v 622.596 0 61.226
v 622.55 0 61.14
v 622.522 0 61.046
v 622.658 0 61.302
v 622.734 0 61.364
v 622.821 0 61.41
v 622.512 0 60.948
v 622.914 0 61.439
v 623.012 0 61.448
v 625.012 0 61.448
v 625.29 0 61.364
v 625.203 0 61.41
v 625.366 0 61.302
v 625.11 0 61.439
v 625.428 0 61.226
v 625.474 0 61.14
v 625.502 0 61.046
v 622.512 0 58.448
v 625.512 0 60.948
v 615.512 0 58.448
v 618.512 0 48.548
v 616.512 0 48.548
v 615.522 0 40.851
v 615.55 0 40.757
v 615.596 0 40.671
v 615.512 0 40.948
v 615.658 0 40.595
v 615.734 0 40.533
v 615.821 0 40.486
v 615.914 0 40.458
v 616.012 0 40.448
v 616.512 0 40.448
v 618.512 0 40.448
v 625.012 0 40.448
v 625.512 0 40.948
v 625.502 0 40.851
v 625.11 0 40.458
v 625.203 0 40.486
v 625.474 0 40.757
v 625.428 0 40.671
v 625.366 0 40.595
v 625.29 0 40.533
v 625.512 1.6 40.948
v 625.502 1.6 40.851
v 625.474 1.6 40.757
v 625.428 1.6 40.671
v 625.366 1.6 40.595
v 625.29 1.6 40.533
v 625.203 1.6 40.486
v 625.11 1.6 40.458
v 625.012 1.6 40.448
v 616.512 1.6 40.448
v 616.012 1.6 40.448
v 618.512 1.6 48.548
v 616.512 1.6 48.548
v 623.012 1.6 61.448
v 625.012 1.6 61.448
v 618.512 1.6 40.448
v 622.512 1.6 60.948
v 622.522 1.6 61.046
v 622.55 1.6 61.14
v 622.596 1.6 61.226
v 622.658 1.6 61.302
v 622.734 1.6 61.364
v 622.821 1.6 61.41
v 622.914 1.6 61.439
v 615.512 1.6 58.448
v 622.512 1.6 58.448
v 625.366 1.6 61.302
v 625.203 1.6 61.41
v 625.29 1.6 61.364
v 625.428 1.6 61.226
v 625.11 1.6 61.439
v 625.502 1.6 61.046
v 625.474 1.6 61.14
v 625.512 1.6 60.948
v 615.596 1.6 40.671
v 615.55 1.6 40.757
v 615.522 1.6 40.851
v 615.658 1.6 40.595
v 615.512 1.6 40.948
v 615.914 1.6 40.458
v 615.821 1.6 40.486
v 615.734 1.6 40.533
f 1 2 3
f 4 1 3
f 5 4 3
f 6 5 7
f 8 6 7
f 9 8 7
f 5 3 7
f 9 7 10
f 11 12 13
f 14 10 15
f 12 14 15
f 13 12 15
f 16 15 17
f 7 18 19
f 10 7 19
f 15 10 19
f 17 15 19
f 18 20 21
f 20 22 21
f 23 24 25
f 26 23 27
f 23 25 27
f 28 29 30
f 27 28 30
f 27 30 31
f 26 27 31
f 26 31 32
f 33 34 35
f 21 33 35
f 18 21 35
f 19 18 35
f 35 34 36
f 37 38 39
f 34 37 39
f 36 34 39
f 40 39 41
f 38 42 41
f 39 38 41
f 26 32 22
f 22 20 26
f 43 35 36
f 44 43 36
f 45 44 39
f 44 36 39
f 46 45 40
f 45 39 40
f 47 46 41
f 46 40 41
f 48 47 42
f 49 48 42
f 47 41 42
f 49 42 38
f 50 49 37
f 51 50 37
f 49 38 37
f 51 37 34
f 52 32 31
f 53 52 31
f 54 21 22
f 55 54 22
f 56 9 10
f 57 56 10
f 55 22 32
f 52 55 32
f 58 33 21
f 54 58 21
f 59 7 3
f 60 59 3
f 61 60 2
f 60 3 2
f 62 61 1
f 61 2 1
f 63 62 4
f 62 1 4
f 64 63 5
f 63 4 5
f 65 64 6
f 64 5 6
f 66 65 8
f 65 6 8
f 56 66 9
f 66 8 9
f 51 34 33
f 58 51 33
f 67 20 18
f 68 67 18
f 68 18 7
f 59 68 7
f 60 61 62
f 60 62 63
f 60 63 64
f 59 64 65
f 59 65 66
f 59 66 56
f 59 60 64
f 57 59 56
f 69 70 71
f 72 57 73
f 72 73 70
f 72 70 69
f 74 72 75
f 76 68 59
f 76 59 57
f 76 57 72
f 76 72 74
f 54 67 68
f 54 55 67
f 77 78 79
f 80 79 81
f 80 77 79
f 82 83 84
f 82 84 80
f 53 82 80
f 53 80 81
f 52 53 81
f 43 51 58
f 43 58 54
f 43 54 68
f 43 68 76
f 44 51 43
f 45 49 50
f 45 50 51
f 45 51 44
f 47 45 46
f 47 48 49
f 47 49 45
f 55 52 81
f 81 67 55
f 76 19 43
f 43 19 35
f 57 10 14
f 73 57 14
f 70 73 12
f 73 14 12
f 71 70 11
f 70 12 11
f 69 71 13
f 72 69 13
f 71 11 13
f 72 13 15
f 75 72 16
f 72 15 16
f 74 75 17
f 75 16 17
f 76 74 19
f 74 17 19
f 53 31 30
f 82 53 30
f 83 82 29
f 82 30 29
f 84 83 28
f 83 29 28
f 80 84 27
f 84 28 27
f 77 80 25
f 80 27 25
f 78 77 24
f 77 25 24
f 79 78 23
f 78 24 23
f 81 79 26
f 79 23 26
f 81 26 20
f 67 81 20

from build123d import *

# Parameters (mm, degrees)
BOSS_EXTRUDE1_DEPTH = 1.6


with BuildPart() as part:
    # Sketch1 → Boss-Extrude1 (new body)
    with BuildSketch(Plane(origin=(0, 0, 0), x_dir=(1, 0, 0), z_dir=(0, 1, 0))):
        with BuildLine():
            Line((623.01202177, -61.448413556), (625.01202177, -61.448413556))
            ThreePointArc((625.01202177, -61.448413556), (625.36557516, -61.301966947), (625.51202177, -60.948413556))
            Line((625.51202177, -60.948413556), (625.51202177, -40.948413556))
            ThreePointArc((625.51202177, -40.948413556), (625.36557516, -40.594860166), (625.01202177, -40.448413556))
            Line((625.01202177, -40.448413556), (618.76202177, -40.448413556))
            Line((618.76202177, -40.448413556), (618.51202177, -40.448413556))
            Line((618.51202177, -40.448413556), (618.51202177, -48.548413556))
            Line((618.51202177, -48.548413556), (616.51202177, -48.548413556))
            Line((616.51202177, -48.548413556), (616.51202177, -40.448413556))
            Line((616.51202177, -40.448413556), (616.26202177, -40.448413556))
            Line((616.26202177, -40.448413556), (616.01202177, -40.448413556))
            ThreePointArc((616.01202177, -40.448413556), (615.658468379, -40.594860166), (615.51202177, -40.948413556))
            Line((615.51202177, -40.948413556), (615.51202177, -58.448413556))
            Line((615.51202177, -58.448413556), (616.26202177, -58.448413556))
            Line((616.26202177, -58.448413556), (618.76202177, -58.448413556))
            Line((618.76202177, -58.448413556), (622.51202177, -58.448413556))
            Line((622.51202177, -58.448413556), (622.51202177, -60.948413556))
            ThreePointArc((622.51202177, -60.948413556), (622.658468379, -61.301966947), (623.01202177, -61.448413556))
        make_face()
    extrude(amount=BOSS_EXTRUDE1_DEPTH)


solid = part.part
